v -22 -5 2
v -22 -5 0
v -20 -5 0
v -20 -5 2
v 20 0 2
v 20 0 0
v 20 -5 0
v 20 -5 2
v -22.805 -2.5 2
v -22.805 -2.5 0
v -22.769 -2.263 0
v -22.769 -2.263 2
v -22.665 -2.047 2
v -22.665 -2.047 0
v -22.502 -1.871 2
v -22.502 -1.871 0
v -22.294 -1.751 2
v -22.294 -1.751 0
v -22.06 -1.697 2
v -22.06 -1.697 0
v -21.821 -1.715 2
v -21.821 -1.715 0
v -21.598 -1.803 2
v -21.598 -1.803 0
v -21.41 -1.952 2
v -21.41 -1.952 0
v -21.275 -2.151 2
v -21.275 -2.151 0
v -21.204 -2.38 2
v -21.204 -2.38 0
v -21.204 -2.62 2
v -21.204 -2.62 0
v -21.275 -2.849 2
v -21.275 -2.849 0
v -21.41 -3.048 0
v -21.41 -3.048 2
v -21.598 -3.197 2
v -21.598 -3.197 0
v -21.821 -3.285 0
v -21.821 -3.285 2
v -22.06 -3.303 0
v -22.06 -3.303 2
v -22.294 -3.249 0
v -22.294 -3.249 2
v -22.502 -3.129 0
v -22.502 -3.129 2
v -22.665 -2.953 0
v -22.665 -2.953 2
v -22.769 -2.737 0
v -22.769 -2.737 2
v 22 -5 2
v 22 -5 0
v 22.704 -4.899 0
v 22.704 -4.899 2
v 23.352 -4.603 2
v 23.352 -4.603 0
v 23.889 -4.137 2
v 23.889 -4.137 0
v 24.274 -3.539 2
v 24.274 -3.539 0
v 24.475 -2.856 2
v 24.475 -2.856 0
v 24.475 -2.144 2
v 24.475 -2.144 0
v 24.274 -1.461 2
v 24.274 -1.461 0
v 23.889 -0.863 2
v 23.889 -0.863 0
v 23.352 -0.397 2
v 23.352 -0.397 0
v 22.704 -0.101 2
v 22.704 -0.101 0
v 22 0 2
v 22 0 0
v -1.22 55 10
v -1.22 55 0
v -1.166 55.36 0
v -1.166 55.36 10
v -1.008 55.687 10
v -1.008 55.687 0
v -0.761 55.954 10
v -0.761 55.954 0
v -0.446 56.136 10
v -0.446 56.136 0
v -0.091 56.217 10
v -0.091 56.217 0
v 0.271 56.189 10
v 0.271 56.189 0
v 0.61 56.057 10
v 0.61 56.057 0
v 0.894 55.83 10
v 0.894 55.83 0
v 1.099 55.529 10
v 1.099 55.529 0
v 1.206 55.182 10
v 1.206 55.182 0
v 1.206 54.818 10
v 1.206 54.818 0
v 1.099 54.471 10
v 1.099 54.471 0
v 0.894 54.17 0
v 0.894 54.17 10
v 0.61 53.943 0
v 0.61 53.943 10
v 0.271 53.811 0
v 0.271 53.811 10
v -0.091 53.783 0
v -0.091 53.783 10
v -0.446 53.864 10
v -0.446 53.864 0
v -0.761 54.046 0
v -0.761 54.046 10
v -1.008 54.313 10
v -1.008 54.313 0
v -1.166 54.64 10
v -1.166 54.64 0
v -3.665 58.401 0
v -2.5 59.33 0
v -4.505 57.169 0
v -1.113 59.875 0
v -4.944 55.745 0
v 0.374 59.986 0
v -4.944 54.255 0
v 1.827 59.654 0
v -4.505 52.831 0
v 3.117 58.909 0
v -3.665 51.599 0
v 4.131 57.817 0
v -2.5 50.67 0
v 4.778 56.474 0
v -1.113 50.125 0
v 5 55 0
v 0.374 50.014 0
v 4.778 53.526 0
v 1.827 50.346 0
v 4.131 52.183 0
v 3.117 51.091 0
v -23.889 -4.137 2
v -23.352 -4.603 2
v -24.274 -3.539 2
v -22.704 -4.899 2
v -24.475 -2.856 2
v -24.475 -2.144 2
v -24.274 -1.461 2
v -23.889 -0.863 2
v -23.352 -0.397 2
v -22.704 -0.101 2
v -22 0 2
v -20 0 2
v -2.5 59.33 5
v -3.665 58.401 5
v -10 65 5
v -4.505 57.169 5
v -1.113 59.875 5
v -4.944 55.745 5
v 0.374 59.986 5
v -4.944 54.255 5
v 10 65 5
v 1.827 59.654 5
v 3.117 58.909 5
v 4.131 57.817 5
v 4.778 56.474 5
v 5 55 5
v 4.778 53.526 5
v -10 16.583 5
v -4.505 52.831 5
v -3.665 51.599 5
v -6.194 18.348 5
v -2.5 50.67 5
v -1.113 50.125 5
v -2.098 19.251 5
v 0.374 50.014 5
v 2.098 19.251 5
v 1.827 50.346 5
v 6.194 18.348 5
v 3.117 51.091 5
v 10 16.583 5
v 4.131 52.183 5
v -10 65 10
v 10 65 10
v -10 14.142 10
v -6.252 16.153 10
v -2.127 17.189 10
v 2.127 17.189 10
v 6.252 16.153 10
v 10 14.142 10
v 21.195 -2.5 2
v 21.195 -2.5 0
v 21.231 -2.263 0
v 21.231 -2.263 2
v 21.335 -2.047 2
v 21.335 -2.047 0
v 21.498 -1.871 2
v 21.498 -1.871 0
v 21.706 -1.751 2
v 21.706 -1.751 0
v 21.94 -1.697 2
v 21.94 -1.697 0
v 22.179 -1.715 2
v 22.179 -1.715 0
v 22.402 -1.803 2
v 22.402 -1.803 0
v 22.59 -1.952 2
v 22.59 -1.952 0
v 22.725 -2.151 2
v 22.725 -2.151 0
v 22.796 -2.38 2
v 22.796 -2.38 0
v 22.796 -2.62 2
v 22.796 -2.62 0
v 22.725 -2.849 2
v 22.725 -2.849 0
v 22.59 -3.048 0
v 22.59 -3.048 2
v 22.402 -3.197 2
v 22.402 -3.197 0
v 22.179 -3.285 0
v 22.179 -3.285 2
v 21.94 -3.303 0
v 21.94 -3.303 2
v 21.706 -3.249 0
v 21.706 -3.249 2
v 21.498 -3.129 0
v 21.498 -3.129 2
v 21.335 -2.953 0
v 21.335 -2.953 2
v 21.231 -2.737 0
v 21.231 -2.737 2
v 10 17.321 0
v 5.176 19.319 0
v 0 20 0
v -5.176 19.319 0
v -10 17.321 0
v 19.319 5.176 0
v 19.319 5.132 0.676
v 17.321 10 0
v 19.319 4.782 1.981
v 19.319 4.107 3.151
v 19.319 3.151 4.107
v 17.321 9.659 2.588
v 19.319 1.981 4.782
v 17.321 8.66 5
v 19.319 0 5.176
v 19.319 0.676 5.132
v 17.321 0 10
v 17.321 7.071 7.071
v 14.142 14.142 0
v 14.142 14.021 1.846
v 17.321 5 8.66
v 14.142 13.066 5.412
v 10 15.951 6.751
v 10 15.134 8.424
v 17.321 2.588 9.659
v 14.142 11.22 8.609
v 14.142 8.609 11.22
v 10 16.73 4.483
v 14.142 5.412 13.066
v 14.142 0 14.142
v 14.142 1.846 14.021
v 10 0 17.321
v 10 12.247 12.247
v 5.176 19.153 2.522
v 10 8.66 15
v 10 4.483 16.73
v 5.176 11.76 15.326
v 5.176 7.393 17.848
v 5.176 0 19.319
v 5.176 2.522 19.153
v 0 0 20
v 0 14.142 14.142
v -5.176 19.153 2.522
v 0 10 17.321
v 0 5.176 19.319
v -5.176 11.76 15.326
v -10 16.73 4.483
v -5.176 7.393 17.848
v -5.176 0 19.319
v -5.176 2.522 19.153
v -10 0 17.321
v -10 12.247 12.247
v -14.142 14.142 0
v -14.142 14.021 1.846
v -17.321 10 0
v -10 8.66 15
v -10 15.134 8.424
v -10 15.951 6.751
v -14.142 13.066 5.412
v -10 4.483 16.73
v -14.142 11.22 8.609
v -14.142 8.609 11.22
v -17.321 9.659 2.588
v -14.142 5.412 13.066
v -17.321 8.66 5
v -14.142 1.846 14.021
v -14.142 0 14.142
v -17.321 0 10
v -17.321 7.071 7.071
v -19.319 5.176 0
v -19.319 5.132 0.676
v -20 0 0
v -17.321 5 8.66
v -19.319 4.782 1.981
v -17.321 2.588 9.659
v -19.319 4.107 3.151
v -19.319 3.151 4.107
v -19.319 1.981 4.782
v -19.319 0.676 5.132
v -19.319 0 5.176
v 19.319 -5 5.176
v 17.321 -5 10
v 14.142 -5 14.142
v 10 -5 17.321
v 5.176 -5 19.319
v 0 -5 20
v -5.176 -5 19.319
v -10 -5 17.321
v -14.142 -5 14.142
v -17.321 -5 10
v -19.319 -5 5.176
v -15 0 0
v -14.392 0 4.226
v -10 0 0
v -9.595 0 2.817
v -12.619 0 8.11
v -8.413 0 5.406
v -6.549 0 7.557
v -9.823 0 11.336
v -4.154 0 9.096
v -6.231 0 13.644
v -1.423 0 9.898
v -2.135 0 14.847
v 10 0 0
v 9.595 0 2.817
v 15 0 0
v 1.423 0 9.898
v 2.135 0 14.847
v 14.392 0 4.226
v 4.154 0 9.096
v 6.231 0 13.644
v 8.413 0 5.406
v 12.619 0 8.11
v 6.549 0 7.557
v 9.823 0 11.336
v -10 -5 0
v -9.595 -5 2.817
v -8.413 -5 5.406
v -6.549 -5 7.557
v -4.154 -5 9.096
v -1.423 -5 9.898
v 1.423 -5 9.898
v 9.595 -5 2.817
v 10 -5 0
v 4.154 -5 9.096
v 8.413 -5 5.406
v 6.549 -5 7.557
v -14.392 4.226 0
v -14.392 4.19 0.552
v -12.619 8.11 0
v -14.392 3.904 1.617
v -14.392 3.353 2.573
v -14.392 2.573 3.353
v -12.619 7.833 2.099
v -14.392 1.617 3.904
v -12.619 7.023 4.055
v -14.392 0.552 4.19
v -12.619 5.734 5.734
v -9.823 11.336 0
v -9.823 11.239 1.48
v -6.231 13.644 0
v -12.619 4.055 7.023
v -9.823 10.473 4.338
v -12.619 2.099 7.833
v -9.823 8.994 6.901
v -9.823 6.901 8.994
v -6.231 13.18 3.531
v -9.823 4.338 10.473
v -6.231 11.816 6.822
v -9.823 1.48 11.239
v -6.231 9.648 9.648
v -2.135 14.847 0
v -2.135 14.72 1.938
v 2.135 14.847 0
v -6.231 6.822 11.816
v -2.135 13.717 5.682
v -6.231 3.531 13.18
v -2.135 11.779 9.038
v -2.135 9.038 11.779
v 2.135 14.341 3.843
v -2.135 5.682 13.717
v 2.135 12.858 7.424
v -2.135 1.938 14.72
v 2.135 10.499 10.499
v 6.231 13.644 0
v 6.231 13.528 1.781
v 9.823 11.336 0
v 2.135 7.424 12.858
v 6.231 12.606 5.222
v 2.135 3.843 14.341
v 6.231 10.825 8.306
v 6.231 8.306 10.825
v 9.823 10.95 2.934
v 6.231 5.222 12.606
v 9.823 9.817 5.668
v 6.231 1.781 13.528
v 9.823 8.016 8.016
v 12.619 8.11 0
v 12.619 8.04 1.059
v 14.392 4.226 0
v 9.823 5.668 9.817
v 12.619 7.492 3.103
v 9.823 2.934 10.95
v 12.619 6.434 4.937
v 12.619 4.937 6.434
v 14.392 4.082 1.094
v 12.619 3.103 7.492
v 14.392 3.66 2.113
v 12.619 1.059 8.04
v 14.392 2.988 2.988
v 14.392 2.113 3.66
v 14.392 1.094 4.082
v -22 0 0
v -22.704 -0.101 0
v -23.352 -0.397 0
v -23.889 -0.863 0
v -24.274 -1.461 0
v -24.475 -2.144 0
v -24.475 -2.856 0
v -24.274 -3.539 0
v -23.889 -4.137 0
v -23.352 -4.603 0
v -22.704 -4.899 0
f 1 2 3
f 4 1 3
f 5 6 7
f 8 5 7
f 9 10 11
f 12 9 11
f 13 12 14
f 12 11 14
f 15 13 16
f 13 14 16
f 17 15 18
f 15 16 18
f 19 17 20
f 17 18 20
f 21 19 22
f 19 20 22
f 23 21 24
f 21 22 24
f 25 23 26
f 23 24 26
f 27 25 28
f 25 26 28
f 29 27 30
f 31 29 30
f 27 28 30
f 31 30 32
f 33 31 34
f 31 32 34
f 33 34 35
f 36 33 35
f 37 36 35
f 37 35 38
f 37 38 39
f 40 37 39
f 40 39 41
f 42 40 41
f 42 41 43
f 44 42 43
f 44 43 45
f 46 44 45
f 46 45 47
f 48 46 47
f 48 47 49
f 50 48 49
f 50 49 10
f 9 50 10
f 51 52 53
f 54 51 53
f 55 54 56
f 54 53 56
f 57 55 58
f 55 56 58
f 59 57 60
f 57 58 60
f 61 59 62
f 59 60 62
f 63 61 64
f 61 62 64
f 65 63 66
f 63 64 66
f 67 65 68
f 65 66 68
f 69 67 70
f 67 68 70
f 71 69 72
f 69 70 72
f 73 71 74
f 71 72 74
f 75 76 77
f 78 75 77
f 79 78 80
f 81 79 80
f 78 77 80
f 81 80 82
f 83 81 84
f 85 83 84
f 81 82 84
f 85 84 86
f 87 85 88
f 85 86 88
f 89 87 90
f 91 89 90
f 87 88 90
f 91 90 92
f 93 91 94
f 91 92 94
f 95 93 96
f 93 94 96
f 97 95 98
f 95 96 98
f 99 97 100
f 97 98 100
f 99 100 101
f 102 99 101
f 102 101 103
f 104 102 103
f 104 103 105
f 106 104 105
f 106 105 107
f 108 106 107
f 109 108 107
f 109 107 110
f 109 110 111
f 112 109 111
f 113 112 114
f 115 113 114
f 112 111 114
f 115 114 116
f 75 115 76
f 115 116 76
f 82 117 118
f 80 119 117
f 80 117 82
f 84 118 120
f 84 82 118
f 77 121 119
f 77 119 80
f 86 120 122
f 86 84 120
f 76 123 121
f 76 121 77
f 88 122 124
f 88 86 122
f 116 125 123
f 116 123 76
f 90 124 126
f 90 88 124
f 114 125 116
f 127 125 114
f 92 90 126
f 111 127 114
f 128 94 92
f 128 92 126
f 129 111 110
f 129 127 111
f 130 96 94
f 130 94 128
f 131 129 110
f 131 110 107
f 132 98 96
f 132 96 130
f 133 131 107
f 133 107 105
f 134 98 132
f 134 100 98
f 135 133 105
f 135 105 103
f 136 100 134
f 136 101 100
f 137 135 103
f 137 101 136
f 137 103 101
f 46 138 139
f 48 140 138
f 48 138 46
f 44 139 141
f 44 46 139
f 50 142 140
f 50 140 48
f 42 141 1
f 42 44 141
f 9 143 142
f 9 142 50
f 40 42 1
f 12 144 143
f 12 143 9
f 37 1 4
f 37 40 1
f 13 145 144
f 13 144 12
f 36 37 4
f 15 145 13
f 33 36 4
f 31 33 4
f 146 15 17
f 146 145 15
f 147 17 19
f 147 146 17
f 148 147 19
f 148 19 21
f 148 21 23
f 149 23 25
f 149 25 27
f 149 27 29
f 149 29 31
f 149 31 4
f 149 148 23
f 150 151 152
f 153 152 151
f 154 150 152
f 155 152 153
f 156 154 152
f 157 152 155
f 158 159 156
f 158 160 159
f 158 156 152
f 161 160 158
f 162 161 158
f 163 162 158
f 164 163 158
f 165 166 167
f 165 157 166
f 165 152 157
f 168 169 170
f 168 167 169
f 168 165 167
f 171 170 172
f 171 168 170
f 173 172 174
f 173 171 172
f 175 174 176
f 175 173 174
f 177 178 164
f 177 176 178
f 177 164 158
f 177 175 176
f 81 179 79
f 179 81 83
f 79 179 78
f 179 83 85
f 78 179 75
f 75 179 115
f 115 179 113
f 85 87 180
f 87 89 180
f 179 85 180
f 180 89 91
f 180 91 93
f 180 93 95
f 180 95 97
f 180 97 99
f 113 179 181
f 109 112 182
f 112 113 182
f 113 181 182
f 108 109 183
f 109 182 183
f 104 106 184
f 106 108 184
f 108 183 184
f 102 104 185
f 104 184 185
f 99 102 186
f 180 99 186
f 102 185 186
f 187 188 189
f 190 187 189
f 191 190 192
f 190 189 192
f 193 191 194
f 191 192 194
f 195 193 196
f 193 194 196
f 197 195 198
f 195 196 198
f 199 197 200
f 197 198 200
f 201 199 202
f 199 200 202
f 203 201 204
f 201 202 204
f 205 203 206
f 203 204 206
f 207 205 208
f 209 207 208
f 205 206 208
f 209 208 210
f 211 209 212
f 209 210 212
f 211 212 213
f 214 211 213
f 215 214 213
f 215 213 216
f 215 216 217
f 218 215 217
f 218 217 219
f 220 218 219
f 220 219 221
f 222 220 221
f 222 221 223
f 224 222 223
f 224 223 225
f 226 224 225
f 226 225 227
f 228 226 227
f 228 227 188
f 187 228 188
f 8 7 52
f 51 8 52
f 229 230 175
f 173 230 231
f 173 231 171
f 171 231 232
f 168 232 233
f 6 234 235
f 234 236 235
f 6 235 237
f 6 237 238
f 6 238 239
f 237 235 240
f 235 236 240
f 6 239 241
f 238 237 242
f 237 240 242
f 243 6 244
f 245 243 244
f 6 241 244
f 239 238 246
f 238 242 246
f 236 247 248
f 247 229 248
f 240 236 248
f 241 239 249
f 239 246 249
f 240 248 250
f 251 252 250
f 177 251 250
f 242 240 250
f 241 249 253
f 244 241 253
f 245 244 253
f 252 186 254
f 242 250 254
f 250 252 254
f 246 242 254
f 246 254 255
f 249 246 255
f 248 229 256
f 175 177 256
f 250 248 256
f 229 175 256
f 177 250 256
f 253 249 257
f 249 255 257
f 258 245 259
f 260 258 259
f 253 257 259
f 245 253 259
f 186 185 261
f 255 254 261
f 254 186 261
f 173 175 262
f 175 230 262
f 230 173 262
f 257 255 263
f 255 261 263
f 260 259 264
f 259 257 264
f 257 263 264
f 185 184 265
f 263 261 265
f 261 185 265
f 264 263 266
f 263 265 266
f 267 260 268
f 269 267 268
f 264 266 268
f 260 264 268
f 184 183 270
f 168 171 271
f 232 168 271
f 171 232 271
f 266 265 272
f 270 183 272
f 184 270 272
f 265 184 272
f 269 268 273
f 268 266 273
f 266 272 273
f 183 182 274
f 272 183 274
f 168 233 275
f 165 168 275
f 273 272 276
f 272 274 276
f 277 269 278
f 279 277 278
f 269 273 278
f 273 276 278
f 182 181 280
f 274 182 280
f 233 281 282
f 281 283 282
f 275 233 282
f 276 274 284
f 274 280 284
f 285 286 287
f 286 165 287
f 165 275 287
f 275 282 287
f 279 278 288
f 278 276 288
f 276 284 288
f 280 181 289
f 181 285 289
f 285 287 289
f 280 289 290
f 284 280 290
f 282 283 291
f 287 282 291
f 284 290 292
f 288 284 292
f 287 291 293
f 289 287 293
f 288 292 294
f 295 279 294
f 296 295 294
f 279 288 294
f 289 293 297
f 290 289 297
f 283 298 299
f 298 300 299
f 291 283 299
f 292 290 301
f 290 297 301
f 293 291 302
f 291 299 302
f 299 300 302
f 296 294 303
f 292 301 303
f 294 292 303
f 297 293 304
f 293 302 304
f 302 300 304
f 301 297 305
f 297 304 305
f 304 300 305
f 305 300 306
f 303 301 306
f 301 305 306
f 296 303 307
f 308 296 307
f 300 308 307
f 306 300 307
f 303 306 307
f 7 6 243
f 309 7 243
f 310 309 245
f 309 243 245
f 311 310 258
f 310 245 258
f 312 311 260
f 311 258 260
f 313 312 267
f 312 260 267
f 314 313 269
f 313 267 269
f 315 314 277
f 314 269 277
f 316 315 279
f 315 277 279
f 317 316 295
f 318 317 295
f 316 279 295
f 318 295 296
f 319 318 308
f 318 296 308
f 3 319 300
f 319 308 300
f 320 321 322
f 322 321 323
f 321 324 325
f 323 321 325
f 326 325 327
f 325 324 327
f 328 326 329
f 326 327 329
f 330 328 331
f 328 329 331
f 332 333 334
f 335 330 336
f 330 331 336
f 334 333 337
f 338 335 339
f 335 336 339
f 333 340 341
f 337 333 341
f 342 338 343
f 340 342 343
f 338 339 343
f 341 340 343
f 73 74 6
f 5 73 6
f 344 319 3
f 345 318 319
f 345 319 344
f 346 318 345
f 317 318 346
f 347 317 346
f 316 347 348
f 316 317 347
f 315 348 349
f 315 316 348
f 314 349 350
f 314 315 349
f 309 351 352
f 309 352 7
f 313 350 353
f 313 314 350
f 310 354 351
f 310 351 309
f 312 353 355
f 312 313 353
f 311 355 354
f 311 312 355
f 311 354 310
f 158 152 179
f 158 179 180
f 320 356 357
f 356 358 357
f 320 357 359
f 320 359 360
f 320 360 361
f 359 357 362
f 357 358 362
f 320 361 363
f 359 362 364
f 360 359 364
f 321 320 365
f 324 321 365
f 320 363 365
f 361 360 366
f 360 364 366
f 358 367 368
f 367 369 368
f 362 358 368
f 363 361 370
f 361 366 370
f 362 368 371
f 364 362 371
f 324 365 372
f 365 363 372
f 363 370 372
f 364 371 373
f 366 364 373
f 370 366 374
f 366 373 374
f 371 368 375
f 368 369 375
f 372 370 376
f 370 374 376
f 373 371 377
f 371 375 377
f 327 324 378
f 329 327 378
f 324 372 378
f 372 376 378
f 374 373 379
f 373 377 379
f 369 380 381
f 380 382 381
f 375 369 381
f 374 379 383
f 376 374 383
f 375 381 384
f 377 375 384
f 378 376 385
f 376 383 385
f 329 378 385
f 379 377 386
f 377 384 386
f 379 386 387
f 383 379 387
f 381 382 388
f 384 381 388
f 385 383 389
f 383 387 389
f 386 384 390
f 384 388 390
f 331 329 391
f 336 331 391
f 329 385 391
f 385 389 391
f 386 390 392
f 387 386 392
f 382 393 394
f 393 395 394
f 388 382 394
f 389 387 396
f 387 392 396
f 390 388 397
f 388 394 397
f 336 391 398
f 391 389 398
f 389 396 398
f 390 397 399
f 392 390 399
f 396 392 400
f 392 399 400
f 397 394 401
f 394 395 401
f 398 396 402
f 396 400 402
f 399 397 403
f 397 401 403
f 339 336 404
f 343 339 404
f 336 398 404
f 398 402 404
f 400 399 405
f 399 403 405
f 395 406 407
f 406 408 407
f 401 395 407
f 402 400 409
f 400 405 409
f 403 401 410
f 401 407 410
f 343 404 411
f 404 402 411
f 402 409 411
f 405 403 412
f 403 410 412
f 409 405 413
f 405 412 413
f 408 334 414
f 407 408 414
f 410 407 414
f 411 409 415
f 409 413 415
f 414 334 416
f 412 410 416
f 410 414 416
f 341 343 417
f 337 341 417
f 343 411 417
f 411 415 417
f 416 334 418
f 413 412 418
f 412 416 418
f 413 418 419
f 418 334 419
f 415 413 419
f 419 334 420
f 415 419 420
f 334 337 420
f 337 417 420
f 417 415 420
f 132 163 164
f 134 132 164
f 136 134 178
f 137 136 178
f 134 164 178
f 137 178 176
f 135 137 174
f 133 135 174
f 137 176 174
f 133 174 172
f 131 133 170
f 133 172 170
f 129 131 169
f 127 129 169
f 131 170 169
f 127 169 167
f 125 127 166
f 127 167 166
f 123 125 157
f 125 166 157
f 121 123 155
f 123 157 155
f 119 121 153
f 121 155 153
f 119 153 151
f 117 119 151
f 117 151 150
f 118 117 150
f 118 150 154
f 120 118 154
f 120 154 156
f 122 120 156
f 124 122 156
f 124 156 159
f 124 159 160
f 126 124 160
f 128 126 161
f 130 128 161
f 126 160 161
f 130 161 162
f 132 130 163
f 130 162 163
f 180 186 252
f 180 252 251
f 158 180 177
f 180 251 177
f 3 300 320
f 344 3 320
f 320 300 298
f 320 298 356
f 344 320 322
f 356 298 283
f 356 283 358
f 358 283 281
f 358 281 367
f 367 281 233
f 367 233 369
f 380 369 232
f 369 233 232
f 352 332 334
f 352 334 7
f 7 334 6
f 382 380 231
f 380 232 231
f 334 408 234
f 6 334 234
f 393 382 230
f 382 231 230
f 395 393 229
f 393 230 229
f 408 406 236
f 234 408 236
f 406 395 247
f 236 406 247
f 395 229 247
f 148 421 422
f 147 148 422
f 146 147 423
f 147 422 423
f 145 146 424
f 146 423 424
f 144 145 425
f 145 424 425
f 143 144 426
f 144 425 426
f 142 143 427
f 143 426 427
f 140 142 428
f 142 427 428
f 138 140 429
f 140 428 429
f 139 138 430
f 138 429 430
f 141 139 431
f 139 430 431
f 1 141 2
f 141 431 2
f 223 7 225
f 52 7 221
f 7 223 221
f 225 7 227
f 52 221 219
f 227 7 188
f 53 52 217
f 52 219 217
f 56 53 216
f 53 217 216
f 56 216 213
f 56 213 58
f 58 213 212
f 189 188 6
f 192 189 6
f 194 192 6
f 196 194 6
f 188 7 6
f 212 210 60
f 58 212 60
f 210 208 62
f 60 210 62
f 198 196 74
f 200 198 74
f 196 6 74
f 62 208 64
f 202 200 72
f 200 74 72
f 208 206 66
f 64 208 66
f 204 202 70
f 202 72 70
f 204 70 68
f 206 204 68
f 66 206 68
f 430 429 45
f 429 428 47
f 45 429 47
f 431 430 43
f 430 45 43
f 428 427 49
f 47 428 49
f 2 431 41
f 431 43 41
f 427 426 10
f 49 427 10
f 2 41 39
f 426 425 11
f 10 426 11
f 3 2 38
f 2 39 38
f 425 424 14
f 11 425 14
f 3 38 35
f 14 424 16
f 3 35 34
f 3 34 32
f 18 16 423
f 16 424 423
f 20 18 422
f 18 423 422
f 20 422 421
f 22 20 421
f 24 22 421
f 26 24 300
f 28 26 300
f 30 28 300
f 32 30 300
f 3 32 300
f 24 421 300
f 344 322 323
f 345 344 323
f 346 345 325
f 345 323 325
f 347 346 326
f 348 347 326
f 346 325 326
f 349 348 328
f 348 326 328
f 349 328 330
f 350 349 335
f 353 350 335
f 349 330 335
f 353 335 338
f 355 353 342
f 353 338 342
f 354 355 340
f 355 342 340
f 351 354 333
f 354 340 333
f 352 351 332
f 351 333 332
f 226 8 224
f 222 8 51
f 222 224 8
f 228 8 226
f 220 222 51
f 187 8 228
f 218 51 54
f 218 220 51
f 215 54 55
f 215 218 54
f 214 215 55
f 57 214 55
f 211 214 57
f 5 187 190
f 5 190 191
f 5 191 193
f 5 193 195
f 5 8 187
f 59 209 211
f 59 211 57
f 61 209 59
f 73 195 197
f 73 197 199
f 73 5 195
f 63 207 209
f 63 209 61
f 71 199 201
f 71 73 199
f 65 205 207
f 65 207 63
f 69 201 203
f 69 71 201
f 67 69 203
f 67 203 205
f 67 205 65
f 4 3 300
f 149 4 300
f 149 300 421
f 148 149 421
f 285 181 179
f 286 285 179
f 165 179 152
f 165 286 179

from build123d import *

# Parameters (mm, degrees)
REVOLVE2_ANGLE        = 90
BOSS_EXTRUDE2_DEPTH   = 5
BOSS_EXTRUDE3_DEPTH   = 2
BOSS_EXTRUDE3_2_DEPTH = 2
BOSS_EXTRUDE4_START   = 14.142136
SKETCH10_W            = 20
SKETCH10_H            = 5
BOSS_EXTRUDE4_DEPTH   = 50.857864
SKETCH11_R            = 5
BOSS_EXTRUDE6_DEPTH   = 5
SKETCH12_R            = 1.22
SKETCH12_R_2          = 0.805
CUT_EXTRUDE1_DEPTH    = 10


with BuildPart() as part:
    # Sketch1 → Revolve2 (revolve)
    with BuildSketch(Plane.XY):
        with BuildLine():
            Line((-20, 0), (-15, 0))
            ThreePointArc((-15, 0), (0, 15), (15, 0))
            Line((15, 0), (20, 0))
            ThreePointArc((20, 0), (0, 20), (-20, 0))
        make_face()
    revolve(axis=Axis((10, 0, 0), (1, 0, 0)), revolution_arc=REVOLVE2_ANGLE)

    # Sketch3 → Boss-Extrude2 (add)
    with BuildSketch(Plane.XZ):
        with BuildLine():
            Line((-20, 0), (-10, 0))
            ThreePointArc((-10, 0), (0, 10), (10, 0))
            Line((10, 0), (20, 0))
            ThreePointArc((20, 0), (0, 20), (-20, 0))
        make_face()
    extrude(amount=BOSS_EXTRUDE2_DEPTH)

    # Sketch10 → Boss-Extrude4 (add)
    with BuildSketch(Plane(origin=(0, 0, 0), x_dir=(1, 0, 0), z_dir=(0, 1, 0)).offset(BOSS_EXTRUDE4_START)):
        with Locations((0, -7.5)):
            Rectangle(SKETCH10_W, SKETCH10_H)
    extrude(amount=BOSS_EXTRUDE4_DEPTH)

    # Sketch11 → Boss-Extrude6 (add)
    with BuildSketch(Plane(origin=(0, 0, 5), x_dir=(-1, 0, 0), z_dir=(0, 0, -1))):
        with Locations(Location((0, 55, 0), (0, 0, 180))):
            Circle(SKETCH11_R)
    extrude(amount=BOSS_EXTRUDE6_DEPTH)


with BuildPart() as body_2:
    # Sketch5 → Boss-Extrude3 (new body)
    with BuildSketch(Plane(origin=(0, 0, 0), x_dir=(-1, 0, 0), z_dir=(0, 0, -1))):
        with BuildLine():
            Line((-22, 0), (-20, 0))
            Line((-20, 0), (-20, -5))
            Line((-20, -5), (-22, -5))
            ThreePointArc((-22, -5), (-24.5, -2.5), (-22, 0))
        make_face()
    extrude(amount=-BOSS_EXTRUDE3_DEPTH)


with BuildPart() as body_3:
    # Sketch5 → Boss-Extrude3 2 (new body)
    with BuildSketch(Plane(origin=(0, 0, 0), x_dir=(-1, 0, 0), z_dir=(0, 0, -1))):
        with BuildLine():
            Line((22, -5), (20, -5))
            Line((20, -5), (20, 0))
            Line((20, 0), (22, 0))
            ThreePointArc((22, 0), (24.5, -2.5), (22, -5))
        make_face()
    extrude(amount=-BOSS_EXTRUDE3_2_DEPTH)


with BuildPart() as cut_extrude1_tool:
    # Sketch12 → Cut-Extrude1 (new body)
    with BuildSketch(Plane(origin=(0, 0, 0), x_dir=(-1, 0, 0), z_dir=(0, 0, -1))):
        with Locations((0, 55)):
            Circle(SKETCH12_R)
        with Locations((-22, -2.5)):
            Circle(SKETCH12_R_2)
        with Locations((22, -2.5)):
            Circle(SKETCH12_R_2)
    extrude(amount=-CUT_EXTRUDE1_DEPTH)


with BuildPart() as part_1:
    add(part.part)

    # Cut-Extrude1: cut by cut_extrude1_tool
    add(cut_extrude1_tool.part, mode=Mode.SUBTRACT)


with BuildPart() as body_2_1:
    add(body_2.part)

    # Cut-Extrude1: cut by cut_extrude1_tool
    add(cut_extrude1_tool.part, mode=Mode.SUBTRACT)


with BuildPart() as body_3_1:
    add(body_3.part)

    # Cut-Extrude1: cut by cut_extrude1_tool
    add(cut_extrude1_tool.part, mode=Mode.SUBTRACT)


solid = Compound([part_1.part, body_2_1.part, body_3_1.part])
